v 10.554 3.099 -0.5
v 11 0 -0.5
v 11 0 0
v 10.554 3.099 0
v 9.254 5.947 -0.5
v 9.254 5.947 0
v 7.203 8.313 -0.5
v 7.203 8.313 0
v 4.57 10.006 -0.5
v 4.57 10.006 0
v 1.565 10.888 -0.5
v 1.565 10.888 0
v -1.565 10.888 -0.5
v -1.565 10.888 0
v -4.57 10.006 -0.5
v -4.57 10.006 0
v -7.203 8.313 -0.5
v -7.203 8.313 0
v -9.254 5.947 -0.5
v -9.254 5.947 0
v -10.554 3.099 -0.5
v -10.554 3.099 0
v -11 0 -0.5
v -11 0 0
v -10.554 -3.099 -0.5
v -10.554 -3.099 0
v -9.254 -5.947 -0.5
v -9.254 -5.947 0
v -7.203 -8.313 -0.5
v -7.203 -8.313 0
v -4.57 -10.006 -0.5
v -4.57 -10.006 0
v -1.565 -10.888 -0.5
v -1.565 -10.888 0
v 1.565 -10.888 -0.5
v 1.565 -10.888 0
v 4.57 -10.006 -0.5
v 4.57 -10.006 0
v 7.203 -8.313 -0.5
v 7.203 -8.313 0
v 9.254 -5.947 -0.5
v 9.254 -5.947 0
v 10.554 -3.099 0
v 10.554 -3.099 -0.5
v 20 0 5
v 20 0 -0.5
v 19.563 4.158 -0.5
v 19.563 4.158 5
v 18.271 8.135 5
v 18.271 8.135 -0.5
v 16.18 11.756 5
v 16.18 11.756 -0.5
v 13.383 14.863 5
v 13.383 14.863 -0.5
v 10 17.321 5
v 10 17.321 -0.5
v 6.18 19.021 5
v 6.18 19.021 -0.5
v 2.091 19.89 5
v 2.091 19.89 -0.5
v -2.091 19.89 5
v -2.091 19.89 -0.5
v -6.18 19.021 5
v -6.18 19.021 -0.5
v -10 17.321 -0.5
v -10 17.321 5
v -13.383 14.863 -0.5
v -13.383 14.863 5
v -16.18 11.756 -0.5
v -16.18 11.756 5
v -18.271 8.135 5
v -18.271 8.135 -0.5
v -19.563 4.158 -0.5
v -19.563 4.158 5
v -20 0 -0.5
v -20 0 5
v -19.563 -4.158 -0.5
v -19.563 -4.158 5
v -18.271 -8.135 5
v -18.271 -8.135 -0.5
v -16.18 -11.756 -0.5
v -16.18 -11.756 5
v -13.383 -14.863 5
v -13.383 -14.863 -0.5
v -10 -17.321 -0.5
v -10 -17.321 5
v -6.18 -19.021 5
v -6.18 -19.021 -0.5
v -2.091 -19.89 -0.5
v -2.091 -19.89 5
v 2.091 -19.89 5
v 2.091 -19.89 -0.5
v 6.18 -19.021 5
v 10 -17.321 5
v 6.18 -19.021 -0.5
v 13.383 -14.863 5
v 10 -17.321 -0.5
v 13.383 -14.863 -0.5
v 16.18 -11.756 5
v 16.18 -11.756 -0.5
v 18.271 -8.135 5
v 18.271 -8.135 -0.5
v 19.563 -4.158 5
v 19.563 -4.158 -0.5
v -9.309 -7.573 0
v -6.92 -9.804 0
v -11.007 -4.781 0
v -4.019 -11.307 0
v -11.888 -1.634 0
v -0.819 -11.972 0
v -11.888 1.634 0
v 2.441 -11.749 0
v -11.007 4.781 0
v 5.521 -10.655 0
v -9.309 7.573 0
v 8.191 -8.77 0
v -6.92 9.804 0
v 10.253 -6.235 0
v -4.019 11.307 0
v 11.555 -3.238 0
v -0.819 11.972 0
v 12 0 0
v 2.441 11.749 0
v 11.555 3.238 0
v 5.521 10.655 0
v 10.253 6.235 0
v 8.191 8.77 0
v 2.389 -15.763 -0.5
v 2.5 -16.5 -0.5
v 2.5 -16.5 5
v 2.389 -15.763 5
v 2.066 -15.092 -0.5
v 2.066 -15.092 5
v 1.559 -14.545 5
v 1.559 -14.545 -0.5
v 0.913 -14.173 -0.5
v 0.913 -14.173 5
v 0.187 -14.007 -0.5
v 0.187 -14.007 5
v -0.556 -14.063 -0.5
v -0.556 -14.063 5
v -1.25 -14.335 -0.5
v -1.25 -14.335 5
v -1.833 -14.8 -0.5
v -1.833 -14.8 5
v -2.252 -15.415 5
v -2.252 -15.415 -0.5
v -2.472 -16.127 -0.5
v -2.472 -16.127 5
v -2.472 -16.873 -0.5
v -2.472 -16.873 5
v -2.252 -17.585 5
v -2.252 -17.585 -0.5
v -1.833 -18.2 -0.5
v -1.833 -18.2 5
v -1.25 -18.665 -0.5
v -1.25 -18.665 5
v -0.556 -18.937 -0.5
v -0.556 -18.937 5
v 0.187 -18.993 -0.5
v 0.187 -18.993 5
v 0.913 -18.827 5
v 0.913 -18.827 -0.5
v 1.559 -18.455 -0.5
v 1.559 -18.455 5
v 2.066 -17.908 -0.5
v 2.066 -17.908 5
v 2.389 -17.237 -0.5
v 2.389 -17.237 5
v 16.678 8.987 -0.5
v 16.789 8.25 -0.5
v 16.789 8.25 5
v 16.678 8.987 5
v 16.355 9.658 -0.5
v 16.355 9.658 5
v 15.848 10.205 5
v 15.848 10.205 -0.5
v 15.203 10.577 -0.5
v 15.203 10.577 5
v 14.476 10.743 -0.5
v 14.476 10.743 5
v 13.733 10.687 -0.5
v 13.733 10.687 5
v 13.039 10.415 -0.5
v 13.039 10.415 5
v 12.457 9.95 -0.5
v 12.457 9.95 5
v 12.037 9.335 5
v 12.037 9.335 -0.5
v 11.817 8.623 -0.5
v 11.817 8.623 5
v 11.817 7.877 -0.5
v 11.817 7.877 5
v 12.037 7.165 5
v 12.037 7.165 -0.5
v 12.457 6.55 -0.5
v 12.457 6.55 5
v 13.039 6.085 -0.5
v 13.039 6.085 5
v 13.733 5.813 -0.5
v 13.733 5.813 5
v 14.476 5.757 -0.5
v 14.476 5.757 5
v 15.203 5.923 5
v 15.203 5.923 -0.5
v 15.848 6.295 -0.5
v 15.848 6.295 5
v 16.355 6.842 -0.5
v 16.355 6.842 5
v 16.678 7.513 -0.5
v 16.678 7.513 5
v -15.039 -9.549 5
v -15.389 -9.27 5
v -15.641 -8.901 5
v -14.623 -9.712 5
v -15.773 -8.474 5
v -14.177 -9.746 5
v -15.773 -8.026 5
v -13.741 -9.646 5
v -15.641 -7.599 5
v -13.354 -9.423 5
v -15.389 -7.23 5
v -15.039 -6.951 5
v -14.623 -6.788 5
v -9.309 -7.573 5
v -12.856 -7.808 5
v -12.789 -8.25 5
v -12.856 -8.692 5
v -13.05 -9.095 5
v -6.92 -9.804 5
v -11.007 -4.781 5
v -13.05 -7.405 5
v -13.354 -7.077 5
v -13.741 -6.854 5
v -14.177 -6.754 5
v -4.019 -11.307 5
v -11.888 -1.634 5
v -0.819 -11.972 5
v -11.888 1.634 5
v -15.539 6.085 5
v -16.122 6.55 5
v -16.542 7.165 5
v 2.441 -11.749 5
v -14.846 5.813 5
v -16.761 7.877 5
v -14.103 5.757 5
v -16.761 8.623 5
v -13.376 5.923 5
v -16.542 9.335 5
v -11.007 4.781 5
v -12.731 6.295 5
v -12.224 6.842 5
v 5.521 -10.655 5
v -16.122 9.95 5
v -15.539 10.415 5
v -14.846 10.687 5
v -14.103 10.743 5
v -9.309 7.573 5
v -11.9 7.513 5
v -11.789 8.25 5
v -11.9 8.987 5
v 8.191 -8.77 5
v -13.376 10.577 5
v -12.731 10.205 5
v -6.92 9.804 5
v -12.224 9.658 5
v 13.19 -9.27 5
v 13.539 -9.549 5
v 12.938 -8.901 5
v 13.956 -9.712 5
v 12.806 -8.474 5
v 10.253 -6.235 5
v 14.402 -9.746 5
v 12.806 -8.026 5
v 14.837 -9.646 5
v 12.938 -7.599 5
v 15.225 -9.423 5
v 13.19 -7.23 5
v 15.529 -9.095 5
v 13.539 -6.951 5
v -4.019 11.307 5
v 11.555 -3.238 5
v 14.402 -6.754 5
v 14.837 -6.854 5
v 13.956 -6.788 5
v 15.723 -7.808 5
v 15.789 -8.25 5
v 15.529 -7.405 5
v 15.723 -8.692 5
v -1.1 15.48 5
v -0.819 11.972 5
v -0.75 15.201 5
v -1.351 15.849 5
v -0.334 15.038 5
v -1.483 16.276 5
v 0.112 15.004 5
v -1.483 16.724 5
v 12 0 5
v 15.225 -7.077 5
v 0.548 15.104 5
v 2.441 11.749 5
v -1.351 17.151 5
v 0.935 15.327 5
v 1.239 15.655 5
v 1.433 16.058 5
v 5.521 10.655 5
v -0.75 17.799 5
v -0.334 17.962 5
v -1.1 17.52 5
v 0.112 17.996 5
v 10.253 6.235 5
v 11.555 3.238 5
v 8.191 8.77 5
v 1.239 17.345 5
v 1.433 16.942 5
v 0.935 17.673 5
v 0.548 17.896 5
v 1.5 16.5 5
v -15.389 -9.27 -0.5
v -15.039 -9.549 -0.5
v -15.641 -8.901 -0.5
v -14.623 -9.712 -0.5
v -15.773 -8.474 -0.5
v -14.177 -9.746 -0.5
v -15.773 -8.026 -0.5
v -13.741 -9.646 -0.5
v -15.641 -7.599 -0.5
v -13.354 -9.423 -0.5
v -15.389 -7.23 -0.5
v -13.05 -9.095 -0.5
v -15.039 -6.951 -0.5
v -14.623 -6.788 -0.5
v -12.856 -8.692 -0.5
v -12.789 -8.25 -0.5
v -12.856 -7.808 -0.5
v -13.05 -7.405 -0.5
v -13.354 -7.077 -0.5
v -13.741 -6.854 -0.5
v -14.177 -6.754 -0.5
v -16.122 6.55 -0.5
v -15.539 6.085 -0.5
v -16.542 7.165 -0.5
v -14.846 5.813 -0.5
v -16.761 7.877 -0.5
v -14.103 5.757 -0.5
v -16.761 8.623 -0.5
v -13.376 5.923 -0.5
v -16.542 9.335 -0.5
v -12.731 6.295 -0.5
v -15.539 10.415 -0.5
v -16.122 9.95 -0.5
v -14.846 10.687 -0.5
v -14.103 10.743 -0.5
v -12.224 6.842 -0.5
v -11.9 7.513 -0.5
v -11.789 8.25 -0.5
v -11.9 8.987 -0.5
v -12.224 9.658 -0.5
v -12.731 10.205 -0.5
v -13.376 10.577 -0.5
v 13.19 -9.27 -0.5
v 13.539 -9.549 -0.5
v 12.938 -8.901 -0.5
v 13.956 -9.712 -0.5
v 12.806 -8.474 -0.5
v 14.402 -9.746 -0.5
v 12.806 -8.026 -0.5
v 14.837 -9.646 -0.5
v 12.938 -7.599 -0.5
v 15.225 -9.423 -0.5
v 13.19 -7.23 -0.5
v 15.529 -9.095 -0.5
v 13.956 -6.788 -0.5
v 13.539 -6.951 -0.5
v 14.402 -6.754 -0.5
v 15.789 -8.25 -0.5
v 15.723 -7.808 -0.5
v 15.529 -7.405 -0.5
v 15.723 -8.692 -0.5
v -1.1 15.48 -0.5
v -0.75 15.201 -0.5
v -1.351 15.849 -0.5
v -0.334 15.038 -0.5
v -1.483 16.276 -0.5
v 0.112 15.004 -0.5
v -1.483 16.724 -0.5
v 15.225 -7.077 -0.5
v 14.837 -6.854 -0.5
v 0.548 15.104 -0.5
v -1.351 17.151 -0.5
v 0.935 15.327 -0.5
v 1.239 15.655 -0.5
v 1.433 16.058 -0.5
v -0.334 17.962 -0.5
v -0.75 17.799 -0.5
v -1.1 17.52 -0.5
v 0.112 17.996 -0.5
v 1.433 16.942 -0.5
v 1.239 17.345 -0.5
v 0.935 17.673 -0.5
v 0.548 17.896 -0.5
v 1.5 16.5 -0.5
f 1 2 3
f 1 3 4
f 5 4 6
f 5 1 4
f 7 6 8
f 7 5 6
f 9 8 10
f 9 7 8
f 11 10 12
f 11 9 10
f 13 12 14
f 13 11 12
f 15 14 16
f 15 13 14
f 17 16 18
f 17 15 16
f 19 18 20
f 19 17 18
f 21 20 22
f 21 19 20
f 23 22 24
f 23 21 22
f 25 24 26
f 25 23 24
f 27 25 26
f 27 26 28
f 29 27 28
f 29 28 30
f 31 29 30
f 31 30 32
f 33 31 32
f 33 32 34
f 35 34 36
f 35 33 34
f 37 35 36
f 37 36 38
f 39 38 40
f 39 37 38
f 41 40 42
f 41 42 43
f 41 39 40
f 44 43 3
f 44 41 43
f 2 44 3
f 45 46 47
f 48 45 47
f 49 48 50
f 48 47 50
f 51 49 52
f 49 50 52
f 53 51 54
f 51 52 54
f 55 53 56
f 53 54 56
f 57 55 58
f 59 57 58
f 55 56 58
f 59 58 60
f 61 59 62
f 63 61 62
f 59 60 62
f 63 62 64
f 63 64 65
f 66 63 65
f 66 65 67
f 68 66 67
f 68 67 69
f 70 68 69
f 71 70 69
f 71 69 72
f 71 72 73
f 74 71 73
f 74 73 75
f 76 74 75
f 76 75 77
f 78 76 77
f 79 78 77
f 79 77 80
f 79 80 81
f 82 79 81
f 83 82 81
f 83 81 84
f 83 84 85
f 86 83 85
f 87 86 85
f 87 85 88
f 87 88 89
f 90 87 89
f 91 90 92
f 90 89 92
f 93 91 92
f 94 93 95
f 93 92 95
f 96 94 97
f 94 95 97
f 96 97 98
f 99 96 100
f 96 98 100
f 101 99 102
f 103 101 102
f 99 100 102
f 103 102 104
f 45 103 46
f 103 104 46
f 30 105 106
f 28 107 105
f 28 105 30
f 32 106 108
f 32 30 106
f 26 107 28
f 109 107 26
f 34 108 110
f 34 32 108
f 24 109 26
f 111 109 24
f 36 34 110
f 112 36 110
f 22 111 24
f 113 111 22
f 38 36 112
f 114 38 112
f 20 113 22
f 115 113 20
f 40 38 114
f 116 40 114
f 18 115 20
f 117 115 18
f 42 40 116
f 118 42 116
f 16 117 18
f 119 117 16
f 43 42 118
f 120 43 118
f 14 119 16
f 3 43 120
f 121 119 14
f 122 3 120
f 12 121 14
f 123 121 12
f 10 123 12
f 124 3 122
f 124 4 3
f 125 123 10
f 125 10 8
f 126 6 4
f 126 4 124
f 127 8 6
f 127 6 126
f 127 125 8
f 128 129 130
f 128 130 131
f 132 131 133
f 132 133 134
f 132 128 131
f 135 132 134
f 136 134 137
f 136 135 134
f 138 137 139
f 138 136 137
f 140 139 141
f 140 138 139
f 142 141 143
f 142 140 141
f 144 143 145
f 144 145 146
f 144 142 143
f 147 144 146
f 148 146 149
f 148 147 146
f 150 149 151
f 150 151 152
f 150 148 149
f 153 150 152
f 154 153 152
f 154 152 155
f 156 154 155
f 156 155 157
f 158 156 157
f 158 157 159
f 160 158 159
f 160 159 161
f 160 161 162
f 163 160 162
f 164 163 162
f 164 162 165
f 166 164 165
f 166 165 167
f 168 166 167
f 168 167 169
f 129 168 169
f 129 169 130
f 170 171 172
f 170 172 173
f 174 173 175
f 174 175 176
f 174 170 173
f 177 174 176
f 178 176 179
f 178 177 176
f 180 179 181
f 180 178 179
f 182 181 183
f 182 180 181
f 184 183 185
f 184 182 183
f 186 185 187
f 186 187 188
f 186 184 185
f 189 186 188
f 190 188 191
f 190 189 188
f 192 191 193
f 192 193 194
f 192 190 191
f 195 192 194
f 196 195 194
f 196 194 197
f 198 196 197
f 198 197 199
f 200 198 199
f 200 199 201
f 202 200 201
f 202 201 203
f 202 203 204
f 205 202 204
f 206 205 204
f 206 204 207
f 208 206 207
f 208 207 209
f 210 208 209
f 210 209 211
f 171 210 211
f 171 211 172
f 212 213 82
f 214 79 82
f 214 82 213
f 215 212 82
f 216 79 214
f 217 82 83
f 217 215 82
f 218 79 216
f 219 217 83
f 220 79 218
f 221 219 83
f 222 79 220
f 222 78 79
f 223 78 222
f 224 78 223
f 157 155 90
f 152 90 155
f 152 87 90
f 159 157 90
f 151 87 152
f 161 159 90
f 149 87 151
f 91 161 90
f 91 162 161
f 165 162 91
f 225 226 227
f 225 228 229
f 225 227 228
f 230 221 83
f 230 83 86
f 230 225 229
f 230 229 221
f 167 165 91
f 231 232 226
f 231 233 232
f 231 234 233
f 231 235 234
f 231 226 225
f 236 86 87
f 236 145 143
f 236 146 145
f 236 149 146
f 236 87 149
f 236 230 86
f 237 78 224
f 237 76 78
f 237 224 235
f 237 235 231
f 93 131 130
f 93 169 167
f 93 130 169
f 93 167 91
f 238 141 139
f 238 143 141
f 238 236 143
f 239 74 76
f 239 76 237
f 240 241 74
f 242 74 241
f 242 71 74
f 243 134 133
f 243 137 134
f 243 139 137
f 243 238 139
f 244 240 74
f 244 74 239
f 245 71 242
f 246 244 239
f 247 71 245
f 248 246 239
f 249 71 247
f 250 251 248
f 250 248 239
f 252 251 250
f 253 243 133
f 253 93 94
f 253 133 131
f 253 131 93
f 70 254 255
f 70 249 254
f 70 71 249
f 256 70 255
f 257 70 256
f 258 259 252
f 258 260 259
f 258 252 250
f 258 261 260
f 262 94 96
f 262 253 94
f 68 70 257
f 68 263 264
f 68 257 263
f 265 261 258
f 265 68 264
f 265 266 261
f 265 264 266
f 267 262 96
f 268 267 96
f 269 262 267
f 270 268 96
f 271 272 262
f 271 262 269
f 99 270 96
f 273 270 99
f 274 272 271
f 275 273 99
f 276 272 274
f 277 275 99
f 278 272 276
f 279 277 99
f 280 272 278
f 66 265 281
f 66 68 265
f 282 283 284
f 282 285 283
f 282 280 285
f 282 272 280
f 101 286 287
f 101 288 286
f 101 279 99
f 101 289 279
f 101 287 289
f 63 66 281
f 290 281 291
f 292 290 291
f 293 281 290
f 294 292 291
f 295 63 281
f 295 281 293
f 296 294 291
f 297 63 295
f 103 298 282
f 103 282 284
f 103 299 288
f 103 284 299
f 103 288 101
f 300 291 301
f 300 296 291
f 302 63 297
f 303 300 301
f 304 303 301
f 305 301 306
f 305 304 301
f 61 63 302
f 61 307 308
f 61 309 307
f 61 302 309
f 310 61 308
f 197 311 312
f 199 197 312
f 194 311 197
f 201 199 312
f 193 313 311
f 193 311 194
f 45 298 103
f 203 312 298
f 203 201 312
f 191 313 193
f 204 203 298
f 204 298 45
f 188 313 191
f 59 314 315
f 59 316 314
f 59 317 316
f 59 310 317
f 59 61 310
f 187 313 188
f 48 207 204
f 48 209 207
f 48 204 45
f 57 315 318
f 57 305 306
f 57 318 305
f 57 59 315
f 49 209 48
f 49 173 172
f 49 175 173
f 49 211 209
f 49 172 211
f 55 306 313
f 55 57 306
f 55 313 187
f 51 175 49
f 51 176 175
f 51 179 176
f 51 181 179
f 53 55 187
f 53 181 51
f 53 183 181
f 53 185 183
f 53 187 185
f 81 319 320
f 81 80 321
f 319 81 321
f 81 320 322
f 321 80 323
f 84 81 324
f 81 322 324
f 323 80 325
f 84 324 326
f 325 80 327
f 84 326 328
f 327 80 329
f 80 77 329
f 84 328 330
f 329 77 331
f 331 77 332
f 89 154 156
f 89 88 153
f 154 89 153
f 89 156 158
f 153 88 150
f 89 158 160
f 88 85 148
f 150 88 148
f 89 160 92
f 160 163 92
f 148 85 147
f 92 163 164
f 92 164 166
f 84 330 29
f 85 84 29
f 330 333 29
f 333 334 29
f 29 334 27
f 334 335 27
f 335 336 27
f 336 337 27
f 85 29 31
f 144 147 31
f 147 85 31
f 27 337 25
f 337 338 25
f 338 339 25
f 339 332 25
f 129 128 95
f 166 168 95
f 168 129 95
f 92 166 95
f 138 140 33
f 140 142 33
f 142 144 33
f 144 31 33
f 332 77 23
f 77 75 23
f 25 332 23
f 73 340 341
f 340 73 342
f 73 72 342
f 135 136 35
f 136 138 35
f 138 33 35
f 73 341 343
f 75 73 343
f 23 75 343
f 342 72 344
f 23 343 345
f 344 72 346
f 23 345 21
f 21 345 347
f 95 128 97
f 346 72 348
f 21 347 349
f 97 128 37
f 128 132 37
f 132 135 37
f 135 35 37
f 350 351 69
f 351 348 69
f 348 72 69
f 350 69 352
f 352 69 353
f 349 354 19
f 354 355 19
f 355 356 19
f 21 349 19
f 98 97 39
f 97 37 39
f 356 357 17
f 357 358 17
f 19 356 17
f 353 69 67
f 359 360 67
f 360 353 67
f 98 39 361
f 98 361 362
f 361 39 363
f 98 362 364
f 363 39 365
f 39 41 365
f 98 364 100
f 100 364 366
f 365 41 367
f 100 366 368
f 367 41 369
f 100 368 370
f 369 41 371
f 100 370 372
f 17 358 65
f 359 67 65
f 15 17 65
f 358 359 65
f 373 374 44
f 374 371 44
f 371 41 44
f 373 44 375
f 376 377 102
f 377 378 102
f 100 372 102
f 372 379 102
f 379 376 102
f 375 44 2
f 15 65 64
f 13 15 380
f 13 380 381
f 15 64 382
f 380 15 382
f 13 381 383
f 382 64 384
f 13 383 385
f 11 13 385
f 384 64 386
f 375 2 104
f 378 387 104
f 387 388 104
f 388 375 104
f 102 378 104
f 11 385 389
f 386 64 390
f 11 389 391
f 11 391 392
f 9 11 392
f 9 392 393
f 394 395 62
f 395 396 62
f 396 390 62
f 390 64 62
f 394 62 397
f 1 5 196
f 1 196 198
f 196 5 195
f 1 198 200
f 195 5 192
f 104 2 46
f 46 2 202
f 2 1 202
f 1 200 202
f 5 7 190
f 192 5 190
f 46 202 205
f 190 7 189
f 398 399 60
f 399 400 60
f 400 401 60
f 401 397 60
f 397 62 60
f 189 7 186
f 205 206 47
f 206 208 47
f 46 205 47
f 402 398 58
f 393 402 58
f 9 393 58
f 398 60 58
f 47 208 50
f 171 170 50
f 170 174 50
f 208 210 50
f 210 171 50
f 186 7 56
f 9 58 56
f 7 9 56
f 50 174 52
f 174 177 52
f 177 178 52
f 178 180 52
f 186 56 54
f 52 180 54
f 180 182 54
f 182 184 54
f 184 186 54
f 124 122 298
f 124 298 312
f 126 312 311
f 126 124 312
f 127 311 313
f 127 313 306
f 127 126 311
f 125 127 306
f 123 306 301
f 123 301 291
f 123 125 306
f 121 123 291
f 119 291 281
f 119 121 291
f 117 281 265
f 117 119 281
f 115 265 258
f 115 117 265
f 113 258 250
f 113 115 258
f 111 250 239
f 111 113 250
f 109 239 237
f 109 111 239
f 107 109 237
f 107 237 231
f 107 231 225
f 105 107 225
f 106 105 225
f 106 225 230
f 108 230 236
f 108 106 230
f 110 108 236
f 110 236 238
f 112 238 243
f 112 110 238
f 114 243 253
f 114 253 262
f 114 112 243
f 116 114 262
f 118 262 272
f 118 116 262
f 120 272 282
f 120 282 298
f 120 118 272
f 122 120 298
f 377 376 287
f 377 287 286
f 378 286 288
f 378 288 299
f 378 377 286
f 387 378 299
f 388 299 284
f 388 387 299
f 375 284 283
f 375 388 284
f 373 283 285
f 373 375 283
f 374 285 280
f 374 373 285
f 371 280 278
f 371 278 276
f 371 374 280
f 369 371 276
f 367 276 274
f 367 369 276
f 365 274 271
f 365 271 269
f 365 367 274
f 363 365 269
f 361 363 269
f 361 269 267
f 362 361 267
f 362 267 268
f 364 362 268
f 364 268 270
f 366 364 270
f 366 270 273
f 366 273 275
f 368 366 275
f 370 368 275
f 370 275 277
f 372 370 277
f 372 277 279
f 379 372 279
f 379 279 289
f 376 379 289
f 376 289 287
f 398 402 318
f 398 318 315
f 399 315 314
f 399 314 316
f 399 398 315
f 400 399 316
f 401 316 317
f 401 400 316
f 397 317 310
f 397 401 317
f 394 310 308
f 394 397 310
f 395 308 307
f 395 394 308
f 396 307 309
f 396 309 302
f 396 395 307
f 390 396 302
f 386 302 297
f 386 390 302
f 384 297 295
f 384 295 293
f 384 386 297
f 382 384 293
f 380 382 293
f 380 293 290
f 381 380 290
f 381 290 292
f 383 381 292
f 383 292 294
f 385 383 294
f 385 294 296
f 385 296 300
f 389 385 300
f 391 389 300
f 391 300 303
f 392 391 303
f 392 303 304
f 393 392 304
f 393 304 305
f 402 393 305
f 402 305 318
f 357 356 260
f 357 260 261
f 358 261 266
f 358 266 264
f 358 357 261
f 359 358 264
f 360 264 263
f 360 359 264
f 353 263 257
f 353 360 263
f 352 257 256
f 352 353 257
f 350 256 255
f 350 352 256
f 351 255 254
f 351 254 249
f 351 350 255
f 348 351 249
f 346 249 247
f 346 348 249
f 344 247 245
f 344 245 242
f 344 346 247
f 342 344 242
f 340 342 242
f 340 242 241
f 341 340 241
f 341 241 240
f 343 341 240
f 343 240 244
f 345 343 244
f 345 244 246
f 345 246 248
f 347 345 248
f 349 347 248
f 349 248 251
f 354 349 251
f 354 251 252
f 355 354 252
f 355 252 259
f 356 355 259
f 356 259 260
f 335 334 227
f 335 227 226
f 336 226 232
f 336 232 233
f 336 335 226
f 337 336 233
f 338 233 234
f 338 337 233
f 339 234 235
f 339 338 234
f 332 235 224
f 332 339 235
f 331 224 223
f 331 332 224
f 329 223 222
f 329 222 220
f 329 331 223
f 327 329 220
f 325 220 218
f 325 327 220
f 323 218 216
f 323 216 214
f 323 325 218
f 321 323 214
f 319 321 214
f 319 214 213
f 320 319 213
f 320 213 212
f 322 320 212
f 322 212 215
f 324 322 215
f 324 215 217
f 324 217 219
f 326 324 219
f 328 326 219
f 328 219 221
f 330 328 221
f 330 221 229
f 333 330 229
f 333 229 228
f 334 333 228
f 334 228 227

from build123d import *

# Parameters (mm, degrees)
SKETCH1_R           = 20
SKETCH1_R_2         = 1.5
SKETCH1_R_3         = 2.5
SKETCH1_R_4         = 12
BOSS_EXTRUDE1_DEPTH = 5
BOSS_EXTRUDE2_START = -0.5
SKETCH1_3_R         = 20
SKETCH1_3_R_2       = 11
SKETCH1_3_R_3       = 1.5
SKETCH1_3_R_4       = 2.5
BOSS_EXTRUDE2_DEPTH = 0.5


with BuildPart() as part:
    # Sketch1 → Boss-Extrude1 (new body)
    with BuildSketch(Plane.XY):
        Circle(SKETCH1_R)
        with Locations((-14.289419162, -8.25)):
            Circle(SKETCH1_R_2, mode=Mode.SUBTRACT)
        with Locations((0, -16.5)):
            Circle(SKETCH1_R_3, mode=Mode.SUBTRACT)
        with Locations((14.289419162, -8.25)):
            Circle(SKETCH1_R_2, mode=Mode.SUBTRACT)
        with Locations((-14.289419162, 8.25)):
            Circle(SKETCH1_R_3, mode=Mode.SUBTRACT)
        Circle(SKETCH1_R_4, mode=Mode.SUBTRACT)
        with Locations((14.289419162, 8.25)):
            Circle(SKETCH1_R_3, mode=Mode.SUBTRACT)
        with Locations((0, 16.5)):
            Circle(SKETCH1_R_2, mode=Mode.SUBTRACT)
    extrude(amount=BOSS_EXTRUDE1_DEPTH)

    # Sketch1<3> → Boss-Extrude2 (add)
    with BuildSketch(Plane.XY.offset(BOSS_EXTRUDE2_START)):
        Circle(SKETCH1_3_R)
        Circle(SKETCH1_3_R_2, mode=Mode.SUBTRACT)
        with Locations((-14.289419162, -8.25)):
            Circle(SKETCH1_3_R_3, mode=Mode.SUBTRACT)
        with Locations((0, -16.5)):
            Circle(SKETCH1_3_R_4, mode=Mode.SUBTRACT)
        with Locations((14.289419162, -8.25)):
            Circle(SKETCH1_3_R_3, mode=Mode.SUBTRACT)
        with Locations((-14.289419162, 8.25)):
            Circle(SKETCH1_3_R_4, mode=Mode.SUBTRACT)
        with Locations((0, 16.5)):
            Circle(SKETCH1_3_R_3, mode=Mode.SUBTRACT)
        with Locations((14.289419162, 8.25)):
            Circle(SKETCH1_3_R_4, mode=Mode.SUBTRACT)
    extrude(amount=BOSS_EXTRUDE2_DEPTH)


solid = part.part
